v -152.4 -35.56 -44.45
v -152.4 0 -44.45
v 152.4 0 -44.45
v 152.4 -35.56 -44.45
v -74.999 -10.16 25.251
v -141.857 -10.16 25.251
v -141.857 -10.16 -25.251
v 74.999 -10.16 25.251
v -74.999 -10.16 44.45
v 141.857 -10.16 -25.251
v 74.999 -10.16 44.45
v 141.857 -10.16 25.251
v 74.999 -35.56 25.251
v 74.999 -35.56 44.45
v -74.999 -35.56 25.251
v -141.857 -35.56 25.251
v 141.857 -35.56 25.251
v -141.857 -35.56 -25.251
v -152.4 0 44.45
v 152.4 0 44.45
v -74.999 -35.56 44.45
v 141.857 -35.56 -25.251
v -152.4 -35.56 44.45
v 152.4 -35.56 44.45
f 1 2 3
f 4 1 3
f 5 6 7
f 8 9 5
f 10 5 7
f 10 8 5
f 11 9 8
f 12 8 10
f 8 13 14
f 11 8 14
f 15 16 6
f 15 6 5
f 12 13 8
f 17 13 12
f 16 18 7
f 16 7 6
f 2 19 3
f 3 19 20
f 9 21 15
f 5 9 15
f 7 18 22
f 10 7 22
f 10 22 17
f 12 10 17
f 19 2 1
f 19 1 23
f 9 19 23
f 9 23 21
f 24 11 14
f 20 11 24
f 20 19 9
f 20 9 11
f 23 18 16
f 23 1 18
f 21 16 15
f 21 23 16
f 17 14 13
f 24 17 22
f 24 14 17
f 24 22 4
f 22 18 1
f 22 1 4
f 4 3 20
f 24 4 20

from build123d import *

# Parameters (mm, degrees)
F0_W     = 304.8
F0_H     = 88.9
F1_DEPTH = 35.56
F3_DEPTH = 25.4
F4_DEPTH = 25.4
F2_W     = 66.8579302463
F2_H     = 50.5015006546
F2_W_2   = 66.8579153451
F5_DEPTH = 25.4


# Not quite as in the source:
# - a feature names something its author has since deleted; it is built from what else it names


with BuildPart() as f1:
    # F0 (on Front) → F1 (new body)
    with BuildSketch(Plane.XZ):
        Rectangle(F0_W, F0_H)
    extrude(amount=F1_DEPTH)

    # F2 (on face) → F3 (cut)
    with BuildSketch(Plane.XZ.offset(35.56)):
        Polygon((-33.3375, 19.1518365622), (-33.3375, 44.45), (-74.9989692254, 44.45), (-74.9989692254, 25.2507503273), (-74.9989692254, -25.2507503273), (74.9989692254, -25.2507503273), (74.9989692254, 25.2507503273), (74.9989692254, 44.45), (33.3375, 44.45), (33.3375, 19.1518365622), align=None)
    extrude(amount=-F3_DEPTH, mode=Mode.SUBTRACT)

    # F4 (cut): a face of the model
    f4_faces = [f1.faces().sort_by_distance(p)[0] for p in [
        (0, -35.56, 31.8009182811),
    ]]
    extrude(f4_faces, amount=-F4_DEPTH, mode=Mode.SUBTRACT)

    # F2 (on face) → F5 (cut)
    with BuildSketch(Plane.XZ.offset(35.56)):
        with Locations((-108.4279343486, 0)):
            Rectangle(F2_W, F2_H)
        with Locations((108.427926898, 0)):
            Rectangle(F2_W_2, F2_H)
    extrude(amount=-F5_DEPTH, mode=Mode.SUBTRACT)


solid = f1.part
